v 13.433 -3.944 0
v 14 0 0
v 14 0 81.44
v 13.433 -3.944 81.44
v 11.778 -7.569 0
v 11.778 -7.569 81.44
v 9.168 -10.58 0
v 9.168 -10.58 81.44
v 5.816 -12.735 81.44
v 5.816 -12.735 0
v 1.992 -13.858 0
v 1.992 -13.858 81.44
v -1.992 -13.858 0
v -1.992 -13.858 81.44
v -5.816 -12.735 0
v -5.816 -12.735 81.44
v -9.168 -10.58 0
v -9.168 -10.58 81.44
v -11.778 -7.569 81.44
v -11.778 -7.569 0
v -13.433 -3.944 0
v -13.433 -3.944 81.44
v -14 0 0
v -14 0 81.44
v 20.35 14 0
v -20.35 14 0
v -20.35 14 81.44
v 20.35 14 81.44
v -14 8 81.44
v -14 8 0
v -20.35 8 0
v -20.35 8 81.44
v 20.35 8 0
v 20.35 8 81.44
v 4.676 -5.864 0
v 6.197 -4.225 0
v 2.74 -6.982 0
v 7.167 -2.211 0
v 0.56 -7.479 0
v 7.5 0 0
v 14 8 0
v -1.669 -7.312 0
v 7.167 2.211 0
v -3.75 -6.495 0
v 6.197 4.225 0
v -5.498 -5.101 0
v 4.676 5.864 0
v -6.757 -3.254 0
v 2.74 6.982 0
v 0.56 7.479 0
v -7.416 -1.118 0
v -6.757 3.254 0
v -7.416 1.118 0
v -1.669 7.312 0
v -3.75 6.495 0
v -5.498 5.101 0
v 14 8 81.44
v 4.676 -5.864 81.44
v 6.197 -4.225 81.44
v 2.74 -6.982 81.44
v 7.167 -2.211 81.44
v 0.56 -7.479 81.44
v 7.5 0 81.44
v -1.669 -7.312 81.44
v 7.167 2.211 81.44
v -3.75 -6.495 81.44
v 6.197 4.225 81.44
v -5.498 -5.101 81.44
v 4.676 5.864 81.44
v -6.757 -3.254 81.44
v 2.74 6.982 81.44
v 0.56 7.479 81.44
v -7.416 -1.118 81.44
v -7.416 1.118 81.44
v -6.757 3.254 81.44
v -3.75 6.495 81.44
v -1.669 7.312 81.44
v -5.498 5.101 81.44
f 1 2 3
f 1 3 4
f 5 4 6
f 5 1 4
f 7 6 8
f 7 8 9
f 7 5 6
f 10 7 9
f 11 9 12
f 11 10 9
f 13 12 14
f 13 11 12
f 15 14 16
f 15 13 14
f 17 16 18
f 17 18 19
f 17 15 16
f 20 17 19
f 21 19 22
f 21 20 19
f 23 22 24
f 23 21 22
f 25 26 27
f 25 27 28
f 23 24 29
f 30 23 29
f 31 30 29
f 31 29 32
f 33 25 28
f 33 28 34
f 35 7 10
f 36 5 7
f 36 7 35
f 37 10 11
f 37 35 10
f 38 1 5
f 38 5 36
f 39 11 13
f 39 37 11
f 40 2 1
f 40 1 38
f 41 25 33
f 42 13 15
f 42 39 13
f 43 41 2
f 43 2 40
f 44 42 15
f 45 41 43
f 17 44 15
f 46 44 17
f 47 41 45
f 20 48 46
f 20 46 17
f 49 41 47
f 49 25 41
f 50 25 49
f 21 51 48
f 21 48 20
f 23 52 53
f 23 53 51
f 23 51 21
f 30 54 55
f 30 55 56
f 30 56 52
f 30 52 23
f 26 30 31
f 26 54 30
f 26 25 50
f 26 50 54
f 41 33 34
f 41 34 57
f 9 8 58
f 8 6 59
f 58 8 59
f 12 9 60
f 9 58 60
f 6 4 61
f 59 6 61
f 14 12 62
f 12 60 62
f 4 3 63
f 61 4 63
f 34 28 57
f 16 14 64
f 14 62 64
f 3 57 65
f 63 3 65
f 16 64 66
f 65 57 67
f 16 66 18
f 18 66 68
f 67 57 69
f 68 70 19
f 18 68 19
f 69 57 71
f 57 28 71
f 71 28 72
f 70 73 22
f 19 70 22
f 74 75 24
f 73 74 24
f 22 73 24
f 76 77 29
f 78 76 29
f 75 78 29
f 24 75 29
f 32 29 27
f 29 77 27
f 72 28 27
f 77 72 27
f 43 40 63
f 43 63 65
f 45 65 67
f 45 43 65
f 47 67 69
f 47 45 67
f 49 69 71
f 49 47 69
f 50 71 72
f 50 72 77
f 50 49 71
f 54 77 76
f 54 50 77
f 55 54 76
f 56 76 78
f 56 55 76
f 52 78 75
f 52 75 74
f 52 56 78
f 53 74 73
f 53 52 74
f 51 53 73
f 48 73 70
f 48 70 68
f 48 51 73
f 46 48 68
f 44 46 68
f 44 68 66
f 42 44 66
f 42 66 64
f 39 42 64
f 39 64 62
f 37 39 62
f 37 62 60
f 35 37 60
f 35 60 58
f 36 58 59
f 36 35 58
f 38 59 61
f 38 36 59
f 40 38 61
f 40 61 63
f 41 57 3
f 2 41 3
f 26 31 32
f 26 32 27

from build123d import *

# Parameters (mm, degrees)
SKETCH1_R           = 7.5
BOSS_EXTRUDE1_DEPTH = 81.44


with BuildPart() as part:
    # Sketch1 → Boss-Extrude1 (new body)
    with BuildSketch(Plane.XY):
        with BuildLine():
            Line((-20.35, 14), (20.35, 14))
            Line((20.35, 14), (20.35, 8))
            Line((20.35, 8), (14, 8))
            Line((14, 8), (14, 0))
            ThreePointArc((14, 0), (0, -14), (-14, 0))
            Line((-14, 0), (-14, 8))
            Line((-14, 8), (-20.35, 8))
            Line((-20.35, 8), (-20.35, 14))
        make_face()
        Circle(SKETCH1_R, mode=Mode.SUBTRACT)
    extrude(amount=BOSS_EXTRUDE1_DEPTH)


solid = part.part
